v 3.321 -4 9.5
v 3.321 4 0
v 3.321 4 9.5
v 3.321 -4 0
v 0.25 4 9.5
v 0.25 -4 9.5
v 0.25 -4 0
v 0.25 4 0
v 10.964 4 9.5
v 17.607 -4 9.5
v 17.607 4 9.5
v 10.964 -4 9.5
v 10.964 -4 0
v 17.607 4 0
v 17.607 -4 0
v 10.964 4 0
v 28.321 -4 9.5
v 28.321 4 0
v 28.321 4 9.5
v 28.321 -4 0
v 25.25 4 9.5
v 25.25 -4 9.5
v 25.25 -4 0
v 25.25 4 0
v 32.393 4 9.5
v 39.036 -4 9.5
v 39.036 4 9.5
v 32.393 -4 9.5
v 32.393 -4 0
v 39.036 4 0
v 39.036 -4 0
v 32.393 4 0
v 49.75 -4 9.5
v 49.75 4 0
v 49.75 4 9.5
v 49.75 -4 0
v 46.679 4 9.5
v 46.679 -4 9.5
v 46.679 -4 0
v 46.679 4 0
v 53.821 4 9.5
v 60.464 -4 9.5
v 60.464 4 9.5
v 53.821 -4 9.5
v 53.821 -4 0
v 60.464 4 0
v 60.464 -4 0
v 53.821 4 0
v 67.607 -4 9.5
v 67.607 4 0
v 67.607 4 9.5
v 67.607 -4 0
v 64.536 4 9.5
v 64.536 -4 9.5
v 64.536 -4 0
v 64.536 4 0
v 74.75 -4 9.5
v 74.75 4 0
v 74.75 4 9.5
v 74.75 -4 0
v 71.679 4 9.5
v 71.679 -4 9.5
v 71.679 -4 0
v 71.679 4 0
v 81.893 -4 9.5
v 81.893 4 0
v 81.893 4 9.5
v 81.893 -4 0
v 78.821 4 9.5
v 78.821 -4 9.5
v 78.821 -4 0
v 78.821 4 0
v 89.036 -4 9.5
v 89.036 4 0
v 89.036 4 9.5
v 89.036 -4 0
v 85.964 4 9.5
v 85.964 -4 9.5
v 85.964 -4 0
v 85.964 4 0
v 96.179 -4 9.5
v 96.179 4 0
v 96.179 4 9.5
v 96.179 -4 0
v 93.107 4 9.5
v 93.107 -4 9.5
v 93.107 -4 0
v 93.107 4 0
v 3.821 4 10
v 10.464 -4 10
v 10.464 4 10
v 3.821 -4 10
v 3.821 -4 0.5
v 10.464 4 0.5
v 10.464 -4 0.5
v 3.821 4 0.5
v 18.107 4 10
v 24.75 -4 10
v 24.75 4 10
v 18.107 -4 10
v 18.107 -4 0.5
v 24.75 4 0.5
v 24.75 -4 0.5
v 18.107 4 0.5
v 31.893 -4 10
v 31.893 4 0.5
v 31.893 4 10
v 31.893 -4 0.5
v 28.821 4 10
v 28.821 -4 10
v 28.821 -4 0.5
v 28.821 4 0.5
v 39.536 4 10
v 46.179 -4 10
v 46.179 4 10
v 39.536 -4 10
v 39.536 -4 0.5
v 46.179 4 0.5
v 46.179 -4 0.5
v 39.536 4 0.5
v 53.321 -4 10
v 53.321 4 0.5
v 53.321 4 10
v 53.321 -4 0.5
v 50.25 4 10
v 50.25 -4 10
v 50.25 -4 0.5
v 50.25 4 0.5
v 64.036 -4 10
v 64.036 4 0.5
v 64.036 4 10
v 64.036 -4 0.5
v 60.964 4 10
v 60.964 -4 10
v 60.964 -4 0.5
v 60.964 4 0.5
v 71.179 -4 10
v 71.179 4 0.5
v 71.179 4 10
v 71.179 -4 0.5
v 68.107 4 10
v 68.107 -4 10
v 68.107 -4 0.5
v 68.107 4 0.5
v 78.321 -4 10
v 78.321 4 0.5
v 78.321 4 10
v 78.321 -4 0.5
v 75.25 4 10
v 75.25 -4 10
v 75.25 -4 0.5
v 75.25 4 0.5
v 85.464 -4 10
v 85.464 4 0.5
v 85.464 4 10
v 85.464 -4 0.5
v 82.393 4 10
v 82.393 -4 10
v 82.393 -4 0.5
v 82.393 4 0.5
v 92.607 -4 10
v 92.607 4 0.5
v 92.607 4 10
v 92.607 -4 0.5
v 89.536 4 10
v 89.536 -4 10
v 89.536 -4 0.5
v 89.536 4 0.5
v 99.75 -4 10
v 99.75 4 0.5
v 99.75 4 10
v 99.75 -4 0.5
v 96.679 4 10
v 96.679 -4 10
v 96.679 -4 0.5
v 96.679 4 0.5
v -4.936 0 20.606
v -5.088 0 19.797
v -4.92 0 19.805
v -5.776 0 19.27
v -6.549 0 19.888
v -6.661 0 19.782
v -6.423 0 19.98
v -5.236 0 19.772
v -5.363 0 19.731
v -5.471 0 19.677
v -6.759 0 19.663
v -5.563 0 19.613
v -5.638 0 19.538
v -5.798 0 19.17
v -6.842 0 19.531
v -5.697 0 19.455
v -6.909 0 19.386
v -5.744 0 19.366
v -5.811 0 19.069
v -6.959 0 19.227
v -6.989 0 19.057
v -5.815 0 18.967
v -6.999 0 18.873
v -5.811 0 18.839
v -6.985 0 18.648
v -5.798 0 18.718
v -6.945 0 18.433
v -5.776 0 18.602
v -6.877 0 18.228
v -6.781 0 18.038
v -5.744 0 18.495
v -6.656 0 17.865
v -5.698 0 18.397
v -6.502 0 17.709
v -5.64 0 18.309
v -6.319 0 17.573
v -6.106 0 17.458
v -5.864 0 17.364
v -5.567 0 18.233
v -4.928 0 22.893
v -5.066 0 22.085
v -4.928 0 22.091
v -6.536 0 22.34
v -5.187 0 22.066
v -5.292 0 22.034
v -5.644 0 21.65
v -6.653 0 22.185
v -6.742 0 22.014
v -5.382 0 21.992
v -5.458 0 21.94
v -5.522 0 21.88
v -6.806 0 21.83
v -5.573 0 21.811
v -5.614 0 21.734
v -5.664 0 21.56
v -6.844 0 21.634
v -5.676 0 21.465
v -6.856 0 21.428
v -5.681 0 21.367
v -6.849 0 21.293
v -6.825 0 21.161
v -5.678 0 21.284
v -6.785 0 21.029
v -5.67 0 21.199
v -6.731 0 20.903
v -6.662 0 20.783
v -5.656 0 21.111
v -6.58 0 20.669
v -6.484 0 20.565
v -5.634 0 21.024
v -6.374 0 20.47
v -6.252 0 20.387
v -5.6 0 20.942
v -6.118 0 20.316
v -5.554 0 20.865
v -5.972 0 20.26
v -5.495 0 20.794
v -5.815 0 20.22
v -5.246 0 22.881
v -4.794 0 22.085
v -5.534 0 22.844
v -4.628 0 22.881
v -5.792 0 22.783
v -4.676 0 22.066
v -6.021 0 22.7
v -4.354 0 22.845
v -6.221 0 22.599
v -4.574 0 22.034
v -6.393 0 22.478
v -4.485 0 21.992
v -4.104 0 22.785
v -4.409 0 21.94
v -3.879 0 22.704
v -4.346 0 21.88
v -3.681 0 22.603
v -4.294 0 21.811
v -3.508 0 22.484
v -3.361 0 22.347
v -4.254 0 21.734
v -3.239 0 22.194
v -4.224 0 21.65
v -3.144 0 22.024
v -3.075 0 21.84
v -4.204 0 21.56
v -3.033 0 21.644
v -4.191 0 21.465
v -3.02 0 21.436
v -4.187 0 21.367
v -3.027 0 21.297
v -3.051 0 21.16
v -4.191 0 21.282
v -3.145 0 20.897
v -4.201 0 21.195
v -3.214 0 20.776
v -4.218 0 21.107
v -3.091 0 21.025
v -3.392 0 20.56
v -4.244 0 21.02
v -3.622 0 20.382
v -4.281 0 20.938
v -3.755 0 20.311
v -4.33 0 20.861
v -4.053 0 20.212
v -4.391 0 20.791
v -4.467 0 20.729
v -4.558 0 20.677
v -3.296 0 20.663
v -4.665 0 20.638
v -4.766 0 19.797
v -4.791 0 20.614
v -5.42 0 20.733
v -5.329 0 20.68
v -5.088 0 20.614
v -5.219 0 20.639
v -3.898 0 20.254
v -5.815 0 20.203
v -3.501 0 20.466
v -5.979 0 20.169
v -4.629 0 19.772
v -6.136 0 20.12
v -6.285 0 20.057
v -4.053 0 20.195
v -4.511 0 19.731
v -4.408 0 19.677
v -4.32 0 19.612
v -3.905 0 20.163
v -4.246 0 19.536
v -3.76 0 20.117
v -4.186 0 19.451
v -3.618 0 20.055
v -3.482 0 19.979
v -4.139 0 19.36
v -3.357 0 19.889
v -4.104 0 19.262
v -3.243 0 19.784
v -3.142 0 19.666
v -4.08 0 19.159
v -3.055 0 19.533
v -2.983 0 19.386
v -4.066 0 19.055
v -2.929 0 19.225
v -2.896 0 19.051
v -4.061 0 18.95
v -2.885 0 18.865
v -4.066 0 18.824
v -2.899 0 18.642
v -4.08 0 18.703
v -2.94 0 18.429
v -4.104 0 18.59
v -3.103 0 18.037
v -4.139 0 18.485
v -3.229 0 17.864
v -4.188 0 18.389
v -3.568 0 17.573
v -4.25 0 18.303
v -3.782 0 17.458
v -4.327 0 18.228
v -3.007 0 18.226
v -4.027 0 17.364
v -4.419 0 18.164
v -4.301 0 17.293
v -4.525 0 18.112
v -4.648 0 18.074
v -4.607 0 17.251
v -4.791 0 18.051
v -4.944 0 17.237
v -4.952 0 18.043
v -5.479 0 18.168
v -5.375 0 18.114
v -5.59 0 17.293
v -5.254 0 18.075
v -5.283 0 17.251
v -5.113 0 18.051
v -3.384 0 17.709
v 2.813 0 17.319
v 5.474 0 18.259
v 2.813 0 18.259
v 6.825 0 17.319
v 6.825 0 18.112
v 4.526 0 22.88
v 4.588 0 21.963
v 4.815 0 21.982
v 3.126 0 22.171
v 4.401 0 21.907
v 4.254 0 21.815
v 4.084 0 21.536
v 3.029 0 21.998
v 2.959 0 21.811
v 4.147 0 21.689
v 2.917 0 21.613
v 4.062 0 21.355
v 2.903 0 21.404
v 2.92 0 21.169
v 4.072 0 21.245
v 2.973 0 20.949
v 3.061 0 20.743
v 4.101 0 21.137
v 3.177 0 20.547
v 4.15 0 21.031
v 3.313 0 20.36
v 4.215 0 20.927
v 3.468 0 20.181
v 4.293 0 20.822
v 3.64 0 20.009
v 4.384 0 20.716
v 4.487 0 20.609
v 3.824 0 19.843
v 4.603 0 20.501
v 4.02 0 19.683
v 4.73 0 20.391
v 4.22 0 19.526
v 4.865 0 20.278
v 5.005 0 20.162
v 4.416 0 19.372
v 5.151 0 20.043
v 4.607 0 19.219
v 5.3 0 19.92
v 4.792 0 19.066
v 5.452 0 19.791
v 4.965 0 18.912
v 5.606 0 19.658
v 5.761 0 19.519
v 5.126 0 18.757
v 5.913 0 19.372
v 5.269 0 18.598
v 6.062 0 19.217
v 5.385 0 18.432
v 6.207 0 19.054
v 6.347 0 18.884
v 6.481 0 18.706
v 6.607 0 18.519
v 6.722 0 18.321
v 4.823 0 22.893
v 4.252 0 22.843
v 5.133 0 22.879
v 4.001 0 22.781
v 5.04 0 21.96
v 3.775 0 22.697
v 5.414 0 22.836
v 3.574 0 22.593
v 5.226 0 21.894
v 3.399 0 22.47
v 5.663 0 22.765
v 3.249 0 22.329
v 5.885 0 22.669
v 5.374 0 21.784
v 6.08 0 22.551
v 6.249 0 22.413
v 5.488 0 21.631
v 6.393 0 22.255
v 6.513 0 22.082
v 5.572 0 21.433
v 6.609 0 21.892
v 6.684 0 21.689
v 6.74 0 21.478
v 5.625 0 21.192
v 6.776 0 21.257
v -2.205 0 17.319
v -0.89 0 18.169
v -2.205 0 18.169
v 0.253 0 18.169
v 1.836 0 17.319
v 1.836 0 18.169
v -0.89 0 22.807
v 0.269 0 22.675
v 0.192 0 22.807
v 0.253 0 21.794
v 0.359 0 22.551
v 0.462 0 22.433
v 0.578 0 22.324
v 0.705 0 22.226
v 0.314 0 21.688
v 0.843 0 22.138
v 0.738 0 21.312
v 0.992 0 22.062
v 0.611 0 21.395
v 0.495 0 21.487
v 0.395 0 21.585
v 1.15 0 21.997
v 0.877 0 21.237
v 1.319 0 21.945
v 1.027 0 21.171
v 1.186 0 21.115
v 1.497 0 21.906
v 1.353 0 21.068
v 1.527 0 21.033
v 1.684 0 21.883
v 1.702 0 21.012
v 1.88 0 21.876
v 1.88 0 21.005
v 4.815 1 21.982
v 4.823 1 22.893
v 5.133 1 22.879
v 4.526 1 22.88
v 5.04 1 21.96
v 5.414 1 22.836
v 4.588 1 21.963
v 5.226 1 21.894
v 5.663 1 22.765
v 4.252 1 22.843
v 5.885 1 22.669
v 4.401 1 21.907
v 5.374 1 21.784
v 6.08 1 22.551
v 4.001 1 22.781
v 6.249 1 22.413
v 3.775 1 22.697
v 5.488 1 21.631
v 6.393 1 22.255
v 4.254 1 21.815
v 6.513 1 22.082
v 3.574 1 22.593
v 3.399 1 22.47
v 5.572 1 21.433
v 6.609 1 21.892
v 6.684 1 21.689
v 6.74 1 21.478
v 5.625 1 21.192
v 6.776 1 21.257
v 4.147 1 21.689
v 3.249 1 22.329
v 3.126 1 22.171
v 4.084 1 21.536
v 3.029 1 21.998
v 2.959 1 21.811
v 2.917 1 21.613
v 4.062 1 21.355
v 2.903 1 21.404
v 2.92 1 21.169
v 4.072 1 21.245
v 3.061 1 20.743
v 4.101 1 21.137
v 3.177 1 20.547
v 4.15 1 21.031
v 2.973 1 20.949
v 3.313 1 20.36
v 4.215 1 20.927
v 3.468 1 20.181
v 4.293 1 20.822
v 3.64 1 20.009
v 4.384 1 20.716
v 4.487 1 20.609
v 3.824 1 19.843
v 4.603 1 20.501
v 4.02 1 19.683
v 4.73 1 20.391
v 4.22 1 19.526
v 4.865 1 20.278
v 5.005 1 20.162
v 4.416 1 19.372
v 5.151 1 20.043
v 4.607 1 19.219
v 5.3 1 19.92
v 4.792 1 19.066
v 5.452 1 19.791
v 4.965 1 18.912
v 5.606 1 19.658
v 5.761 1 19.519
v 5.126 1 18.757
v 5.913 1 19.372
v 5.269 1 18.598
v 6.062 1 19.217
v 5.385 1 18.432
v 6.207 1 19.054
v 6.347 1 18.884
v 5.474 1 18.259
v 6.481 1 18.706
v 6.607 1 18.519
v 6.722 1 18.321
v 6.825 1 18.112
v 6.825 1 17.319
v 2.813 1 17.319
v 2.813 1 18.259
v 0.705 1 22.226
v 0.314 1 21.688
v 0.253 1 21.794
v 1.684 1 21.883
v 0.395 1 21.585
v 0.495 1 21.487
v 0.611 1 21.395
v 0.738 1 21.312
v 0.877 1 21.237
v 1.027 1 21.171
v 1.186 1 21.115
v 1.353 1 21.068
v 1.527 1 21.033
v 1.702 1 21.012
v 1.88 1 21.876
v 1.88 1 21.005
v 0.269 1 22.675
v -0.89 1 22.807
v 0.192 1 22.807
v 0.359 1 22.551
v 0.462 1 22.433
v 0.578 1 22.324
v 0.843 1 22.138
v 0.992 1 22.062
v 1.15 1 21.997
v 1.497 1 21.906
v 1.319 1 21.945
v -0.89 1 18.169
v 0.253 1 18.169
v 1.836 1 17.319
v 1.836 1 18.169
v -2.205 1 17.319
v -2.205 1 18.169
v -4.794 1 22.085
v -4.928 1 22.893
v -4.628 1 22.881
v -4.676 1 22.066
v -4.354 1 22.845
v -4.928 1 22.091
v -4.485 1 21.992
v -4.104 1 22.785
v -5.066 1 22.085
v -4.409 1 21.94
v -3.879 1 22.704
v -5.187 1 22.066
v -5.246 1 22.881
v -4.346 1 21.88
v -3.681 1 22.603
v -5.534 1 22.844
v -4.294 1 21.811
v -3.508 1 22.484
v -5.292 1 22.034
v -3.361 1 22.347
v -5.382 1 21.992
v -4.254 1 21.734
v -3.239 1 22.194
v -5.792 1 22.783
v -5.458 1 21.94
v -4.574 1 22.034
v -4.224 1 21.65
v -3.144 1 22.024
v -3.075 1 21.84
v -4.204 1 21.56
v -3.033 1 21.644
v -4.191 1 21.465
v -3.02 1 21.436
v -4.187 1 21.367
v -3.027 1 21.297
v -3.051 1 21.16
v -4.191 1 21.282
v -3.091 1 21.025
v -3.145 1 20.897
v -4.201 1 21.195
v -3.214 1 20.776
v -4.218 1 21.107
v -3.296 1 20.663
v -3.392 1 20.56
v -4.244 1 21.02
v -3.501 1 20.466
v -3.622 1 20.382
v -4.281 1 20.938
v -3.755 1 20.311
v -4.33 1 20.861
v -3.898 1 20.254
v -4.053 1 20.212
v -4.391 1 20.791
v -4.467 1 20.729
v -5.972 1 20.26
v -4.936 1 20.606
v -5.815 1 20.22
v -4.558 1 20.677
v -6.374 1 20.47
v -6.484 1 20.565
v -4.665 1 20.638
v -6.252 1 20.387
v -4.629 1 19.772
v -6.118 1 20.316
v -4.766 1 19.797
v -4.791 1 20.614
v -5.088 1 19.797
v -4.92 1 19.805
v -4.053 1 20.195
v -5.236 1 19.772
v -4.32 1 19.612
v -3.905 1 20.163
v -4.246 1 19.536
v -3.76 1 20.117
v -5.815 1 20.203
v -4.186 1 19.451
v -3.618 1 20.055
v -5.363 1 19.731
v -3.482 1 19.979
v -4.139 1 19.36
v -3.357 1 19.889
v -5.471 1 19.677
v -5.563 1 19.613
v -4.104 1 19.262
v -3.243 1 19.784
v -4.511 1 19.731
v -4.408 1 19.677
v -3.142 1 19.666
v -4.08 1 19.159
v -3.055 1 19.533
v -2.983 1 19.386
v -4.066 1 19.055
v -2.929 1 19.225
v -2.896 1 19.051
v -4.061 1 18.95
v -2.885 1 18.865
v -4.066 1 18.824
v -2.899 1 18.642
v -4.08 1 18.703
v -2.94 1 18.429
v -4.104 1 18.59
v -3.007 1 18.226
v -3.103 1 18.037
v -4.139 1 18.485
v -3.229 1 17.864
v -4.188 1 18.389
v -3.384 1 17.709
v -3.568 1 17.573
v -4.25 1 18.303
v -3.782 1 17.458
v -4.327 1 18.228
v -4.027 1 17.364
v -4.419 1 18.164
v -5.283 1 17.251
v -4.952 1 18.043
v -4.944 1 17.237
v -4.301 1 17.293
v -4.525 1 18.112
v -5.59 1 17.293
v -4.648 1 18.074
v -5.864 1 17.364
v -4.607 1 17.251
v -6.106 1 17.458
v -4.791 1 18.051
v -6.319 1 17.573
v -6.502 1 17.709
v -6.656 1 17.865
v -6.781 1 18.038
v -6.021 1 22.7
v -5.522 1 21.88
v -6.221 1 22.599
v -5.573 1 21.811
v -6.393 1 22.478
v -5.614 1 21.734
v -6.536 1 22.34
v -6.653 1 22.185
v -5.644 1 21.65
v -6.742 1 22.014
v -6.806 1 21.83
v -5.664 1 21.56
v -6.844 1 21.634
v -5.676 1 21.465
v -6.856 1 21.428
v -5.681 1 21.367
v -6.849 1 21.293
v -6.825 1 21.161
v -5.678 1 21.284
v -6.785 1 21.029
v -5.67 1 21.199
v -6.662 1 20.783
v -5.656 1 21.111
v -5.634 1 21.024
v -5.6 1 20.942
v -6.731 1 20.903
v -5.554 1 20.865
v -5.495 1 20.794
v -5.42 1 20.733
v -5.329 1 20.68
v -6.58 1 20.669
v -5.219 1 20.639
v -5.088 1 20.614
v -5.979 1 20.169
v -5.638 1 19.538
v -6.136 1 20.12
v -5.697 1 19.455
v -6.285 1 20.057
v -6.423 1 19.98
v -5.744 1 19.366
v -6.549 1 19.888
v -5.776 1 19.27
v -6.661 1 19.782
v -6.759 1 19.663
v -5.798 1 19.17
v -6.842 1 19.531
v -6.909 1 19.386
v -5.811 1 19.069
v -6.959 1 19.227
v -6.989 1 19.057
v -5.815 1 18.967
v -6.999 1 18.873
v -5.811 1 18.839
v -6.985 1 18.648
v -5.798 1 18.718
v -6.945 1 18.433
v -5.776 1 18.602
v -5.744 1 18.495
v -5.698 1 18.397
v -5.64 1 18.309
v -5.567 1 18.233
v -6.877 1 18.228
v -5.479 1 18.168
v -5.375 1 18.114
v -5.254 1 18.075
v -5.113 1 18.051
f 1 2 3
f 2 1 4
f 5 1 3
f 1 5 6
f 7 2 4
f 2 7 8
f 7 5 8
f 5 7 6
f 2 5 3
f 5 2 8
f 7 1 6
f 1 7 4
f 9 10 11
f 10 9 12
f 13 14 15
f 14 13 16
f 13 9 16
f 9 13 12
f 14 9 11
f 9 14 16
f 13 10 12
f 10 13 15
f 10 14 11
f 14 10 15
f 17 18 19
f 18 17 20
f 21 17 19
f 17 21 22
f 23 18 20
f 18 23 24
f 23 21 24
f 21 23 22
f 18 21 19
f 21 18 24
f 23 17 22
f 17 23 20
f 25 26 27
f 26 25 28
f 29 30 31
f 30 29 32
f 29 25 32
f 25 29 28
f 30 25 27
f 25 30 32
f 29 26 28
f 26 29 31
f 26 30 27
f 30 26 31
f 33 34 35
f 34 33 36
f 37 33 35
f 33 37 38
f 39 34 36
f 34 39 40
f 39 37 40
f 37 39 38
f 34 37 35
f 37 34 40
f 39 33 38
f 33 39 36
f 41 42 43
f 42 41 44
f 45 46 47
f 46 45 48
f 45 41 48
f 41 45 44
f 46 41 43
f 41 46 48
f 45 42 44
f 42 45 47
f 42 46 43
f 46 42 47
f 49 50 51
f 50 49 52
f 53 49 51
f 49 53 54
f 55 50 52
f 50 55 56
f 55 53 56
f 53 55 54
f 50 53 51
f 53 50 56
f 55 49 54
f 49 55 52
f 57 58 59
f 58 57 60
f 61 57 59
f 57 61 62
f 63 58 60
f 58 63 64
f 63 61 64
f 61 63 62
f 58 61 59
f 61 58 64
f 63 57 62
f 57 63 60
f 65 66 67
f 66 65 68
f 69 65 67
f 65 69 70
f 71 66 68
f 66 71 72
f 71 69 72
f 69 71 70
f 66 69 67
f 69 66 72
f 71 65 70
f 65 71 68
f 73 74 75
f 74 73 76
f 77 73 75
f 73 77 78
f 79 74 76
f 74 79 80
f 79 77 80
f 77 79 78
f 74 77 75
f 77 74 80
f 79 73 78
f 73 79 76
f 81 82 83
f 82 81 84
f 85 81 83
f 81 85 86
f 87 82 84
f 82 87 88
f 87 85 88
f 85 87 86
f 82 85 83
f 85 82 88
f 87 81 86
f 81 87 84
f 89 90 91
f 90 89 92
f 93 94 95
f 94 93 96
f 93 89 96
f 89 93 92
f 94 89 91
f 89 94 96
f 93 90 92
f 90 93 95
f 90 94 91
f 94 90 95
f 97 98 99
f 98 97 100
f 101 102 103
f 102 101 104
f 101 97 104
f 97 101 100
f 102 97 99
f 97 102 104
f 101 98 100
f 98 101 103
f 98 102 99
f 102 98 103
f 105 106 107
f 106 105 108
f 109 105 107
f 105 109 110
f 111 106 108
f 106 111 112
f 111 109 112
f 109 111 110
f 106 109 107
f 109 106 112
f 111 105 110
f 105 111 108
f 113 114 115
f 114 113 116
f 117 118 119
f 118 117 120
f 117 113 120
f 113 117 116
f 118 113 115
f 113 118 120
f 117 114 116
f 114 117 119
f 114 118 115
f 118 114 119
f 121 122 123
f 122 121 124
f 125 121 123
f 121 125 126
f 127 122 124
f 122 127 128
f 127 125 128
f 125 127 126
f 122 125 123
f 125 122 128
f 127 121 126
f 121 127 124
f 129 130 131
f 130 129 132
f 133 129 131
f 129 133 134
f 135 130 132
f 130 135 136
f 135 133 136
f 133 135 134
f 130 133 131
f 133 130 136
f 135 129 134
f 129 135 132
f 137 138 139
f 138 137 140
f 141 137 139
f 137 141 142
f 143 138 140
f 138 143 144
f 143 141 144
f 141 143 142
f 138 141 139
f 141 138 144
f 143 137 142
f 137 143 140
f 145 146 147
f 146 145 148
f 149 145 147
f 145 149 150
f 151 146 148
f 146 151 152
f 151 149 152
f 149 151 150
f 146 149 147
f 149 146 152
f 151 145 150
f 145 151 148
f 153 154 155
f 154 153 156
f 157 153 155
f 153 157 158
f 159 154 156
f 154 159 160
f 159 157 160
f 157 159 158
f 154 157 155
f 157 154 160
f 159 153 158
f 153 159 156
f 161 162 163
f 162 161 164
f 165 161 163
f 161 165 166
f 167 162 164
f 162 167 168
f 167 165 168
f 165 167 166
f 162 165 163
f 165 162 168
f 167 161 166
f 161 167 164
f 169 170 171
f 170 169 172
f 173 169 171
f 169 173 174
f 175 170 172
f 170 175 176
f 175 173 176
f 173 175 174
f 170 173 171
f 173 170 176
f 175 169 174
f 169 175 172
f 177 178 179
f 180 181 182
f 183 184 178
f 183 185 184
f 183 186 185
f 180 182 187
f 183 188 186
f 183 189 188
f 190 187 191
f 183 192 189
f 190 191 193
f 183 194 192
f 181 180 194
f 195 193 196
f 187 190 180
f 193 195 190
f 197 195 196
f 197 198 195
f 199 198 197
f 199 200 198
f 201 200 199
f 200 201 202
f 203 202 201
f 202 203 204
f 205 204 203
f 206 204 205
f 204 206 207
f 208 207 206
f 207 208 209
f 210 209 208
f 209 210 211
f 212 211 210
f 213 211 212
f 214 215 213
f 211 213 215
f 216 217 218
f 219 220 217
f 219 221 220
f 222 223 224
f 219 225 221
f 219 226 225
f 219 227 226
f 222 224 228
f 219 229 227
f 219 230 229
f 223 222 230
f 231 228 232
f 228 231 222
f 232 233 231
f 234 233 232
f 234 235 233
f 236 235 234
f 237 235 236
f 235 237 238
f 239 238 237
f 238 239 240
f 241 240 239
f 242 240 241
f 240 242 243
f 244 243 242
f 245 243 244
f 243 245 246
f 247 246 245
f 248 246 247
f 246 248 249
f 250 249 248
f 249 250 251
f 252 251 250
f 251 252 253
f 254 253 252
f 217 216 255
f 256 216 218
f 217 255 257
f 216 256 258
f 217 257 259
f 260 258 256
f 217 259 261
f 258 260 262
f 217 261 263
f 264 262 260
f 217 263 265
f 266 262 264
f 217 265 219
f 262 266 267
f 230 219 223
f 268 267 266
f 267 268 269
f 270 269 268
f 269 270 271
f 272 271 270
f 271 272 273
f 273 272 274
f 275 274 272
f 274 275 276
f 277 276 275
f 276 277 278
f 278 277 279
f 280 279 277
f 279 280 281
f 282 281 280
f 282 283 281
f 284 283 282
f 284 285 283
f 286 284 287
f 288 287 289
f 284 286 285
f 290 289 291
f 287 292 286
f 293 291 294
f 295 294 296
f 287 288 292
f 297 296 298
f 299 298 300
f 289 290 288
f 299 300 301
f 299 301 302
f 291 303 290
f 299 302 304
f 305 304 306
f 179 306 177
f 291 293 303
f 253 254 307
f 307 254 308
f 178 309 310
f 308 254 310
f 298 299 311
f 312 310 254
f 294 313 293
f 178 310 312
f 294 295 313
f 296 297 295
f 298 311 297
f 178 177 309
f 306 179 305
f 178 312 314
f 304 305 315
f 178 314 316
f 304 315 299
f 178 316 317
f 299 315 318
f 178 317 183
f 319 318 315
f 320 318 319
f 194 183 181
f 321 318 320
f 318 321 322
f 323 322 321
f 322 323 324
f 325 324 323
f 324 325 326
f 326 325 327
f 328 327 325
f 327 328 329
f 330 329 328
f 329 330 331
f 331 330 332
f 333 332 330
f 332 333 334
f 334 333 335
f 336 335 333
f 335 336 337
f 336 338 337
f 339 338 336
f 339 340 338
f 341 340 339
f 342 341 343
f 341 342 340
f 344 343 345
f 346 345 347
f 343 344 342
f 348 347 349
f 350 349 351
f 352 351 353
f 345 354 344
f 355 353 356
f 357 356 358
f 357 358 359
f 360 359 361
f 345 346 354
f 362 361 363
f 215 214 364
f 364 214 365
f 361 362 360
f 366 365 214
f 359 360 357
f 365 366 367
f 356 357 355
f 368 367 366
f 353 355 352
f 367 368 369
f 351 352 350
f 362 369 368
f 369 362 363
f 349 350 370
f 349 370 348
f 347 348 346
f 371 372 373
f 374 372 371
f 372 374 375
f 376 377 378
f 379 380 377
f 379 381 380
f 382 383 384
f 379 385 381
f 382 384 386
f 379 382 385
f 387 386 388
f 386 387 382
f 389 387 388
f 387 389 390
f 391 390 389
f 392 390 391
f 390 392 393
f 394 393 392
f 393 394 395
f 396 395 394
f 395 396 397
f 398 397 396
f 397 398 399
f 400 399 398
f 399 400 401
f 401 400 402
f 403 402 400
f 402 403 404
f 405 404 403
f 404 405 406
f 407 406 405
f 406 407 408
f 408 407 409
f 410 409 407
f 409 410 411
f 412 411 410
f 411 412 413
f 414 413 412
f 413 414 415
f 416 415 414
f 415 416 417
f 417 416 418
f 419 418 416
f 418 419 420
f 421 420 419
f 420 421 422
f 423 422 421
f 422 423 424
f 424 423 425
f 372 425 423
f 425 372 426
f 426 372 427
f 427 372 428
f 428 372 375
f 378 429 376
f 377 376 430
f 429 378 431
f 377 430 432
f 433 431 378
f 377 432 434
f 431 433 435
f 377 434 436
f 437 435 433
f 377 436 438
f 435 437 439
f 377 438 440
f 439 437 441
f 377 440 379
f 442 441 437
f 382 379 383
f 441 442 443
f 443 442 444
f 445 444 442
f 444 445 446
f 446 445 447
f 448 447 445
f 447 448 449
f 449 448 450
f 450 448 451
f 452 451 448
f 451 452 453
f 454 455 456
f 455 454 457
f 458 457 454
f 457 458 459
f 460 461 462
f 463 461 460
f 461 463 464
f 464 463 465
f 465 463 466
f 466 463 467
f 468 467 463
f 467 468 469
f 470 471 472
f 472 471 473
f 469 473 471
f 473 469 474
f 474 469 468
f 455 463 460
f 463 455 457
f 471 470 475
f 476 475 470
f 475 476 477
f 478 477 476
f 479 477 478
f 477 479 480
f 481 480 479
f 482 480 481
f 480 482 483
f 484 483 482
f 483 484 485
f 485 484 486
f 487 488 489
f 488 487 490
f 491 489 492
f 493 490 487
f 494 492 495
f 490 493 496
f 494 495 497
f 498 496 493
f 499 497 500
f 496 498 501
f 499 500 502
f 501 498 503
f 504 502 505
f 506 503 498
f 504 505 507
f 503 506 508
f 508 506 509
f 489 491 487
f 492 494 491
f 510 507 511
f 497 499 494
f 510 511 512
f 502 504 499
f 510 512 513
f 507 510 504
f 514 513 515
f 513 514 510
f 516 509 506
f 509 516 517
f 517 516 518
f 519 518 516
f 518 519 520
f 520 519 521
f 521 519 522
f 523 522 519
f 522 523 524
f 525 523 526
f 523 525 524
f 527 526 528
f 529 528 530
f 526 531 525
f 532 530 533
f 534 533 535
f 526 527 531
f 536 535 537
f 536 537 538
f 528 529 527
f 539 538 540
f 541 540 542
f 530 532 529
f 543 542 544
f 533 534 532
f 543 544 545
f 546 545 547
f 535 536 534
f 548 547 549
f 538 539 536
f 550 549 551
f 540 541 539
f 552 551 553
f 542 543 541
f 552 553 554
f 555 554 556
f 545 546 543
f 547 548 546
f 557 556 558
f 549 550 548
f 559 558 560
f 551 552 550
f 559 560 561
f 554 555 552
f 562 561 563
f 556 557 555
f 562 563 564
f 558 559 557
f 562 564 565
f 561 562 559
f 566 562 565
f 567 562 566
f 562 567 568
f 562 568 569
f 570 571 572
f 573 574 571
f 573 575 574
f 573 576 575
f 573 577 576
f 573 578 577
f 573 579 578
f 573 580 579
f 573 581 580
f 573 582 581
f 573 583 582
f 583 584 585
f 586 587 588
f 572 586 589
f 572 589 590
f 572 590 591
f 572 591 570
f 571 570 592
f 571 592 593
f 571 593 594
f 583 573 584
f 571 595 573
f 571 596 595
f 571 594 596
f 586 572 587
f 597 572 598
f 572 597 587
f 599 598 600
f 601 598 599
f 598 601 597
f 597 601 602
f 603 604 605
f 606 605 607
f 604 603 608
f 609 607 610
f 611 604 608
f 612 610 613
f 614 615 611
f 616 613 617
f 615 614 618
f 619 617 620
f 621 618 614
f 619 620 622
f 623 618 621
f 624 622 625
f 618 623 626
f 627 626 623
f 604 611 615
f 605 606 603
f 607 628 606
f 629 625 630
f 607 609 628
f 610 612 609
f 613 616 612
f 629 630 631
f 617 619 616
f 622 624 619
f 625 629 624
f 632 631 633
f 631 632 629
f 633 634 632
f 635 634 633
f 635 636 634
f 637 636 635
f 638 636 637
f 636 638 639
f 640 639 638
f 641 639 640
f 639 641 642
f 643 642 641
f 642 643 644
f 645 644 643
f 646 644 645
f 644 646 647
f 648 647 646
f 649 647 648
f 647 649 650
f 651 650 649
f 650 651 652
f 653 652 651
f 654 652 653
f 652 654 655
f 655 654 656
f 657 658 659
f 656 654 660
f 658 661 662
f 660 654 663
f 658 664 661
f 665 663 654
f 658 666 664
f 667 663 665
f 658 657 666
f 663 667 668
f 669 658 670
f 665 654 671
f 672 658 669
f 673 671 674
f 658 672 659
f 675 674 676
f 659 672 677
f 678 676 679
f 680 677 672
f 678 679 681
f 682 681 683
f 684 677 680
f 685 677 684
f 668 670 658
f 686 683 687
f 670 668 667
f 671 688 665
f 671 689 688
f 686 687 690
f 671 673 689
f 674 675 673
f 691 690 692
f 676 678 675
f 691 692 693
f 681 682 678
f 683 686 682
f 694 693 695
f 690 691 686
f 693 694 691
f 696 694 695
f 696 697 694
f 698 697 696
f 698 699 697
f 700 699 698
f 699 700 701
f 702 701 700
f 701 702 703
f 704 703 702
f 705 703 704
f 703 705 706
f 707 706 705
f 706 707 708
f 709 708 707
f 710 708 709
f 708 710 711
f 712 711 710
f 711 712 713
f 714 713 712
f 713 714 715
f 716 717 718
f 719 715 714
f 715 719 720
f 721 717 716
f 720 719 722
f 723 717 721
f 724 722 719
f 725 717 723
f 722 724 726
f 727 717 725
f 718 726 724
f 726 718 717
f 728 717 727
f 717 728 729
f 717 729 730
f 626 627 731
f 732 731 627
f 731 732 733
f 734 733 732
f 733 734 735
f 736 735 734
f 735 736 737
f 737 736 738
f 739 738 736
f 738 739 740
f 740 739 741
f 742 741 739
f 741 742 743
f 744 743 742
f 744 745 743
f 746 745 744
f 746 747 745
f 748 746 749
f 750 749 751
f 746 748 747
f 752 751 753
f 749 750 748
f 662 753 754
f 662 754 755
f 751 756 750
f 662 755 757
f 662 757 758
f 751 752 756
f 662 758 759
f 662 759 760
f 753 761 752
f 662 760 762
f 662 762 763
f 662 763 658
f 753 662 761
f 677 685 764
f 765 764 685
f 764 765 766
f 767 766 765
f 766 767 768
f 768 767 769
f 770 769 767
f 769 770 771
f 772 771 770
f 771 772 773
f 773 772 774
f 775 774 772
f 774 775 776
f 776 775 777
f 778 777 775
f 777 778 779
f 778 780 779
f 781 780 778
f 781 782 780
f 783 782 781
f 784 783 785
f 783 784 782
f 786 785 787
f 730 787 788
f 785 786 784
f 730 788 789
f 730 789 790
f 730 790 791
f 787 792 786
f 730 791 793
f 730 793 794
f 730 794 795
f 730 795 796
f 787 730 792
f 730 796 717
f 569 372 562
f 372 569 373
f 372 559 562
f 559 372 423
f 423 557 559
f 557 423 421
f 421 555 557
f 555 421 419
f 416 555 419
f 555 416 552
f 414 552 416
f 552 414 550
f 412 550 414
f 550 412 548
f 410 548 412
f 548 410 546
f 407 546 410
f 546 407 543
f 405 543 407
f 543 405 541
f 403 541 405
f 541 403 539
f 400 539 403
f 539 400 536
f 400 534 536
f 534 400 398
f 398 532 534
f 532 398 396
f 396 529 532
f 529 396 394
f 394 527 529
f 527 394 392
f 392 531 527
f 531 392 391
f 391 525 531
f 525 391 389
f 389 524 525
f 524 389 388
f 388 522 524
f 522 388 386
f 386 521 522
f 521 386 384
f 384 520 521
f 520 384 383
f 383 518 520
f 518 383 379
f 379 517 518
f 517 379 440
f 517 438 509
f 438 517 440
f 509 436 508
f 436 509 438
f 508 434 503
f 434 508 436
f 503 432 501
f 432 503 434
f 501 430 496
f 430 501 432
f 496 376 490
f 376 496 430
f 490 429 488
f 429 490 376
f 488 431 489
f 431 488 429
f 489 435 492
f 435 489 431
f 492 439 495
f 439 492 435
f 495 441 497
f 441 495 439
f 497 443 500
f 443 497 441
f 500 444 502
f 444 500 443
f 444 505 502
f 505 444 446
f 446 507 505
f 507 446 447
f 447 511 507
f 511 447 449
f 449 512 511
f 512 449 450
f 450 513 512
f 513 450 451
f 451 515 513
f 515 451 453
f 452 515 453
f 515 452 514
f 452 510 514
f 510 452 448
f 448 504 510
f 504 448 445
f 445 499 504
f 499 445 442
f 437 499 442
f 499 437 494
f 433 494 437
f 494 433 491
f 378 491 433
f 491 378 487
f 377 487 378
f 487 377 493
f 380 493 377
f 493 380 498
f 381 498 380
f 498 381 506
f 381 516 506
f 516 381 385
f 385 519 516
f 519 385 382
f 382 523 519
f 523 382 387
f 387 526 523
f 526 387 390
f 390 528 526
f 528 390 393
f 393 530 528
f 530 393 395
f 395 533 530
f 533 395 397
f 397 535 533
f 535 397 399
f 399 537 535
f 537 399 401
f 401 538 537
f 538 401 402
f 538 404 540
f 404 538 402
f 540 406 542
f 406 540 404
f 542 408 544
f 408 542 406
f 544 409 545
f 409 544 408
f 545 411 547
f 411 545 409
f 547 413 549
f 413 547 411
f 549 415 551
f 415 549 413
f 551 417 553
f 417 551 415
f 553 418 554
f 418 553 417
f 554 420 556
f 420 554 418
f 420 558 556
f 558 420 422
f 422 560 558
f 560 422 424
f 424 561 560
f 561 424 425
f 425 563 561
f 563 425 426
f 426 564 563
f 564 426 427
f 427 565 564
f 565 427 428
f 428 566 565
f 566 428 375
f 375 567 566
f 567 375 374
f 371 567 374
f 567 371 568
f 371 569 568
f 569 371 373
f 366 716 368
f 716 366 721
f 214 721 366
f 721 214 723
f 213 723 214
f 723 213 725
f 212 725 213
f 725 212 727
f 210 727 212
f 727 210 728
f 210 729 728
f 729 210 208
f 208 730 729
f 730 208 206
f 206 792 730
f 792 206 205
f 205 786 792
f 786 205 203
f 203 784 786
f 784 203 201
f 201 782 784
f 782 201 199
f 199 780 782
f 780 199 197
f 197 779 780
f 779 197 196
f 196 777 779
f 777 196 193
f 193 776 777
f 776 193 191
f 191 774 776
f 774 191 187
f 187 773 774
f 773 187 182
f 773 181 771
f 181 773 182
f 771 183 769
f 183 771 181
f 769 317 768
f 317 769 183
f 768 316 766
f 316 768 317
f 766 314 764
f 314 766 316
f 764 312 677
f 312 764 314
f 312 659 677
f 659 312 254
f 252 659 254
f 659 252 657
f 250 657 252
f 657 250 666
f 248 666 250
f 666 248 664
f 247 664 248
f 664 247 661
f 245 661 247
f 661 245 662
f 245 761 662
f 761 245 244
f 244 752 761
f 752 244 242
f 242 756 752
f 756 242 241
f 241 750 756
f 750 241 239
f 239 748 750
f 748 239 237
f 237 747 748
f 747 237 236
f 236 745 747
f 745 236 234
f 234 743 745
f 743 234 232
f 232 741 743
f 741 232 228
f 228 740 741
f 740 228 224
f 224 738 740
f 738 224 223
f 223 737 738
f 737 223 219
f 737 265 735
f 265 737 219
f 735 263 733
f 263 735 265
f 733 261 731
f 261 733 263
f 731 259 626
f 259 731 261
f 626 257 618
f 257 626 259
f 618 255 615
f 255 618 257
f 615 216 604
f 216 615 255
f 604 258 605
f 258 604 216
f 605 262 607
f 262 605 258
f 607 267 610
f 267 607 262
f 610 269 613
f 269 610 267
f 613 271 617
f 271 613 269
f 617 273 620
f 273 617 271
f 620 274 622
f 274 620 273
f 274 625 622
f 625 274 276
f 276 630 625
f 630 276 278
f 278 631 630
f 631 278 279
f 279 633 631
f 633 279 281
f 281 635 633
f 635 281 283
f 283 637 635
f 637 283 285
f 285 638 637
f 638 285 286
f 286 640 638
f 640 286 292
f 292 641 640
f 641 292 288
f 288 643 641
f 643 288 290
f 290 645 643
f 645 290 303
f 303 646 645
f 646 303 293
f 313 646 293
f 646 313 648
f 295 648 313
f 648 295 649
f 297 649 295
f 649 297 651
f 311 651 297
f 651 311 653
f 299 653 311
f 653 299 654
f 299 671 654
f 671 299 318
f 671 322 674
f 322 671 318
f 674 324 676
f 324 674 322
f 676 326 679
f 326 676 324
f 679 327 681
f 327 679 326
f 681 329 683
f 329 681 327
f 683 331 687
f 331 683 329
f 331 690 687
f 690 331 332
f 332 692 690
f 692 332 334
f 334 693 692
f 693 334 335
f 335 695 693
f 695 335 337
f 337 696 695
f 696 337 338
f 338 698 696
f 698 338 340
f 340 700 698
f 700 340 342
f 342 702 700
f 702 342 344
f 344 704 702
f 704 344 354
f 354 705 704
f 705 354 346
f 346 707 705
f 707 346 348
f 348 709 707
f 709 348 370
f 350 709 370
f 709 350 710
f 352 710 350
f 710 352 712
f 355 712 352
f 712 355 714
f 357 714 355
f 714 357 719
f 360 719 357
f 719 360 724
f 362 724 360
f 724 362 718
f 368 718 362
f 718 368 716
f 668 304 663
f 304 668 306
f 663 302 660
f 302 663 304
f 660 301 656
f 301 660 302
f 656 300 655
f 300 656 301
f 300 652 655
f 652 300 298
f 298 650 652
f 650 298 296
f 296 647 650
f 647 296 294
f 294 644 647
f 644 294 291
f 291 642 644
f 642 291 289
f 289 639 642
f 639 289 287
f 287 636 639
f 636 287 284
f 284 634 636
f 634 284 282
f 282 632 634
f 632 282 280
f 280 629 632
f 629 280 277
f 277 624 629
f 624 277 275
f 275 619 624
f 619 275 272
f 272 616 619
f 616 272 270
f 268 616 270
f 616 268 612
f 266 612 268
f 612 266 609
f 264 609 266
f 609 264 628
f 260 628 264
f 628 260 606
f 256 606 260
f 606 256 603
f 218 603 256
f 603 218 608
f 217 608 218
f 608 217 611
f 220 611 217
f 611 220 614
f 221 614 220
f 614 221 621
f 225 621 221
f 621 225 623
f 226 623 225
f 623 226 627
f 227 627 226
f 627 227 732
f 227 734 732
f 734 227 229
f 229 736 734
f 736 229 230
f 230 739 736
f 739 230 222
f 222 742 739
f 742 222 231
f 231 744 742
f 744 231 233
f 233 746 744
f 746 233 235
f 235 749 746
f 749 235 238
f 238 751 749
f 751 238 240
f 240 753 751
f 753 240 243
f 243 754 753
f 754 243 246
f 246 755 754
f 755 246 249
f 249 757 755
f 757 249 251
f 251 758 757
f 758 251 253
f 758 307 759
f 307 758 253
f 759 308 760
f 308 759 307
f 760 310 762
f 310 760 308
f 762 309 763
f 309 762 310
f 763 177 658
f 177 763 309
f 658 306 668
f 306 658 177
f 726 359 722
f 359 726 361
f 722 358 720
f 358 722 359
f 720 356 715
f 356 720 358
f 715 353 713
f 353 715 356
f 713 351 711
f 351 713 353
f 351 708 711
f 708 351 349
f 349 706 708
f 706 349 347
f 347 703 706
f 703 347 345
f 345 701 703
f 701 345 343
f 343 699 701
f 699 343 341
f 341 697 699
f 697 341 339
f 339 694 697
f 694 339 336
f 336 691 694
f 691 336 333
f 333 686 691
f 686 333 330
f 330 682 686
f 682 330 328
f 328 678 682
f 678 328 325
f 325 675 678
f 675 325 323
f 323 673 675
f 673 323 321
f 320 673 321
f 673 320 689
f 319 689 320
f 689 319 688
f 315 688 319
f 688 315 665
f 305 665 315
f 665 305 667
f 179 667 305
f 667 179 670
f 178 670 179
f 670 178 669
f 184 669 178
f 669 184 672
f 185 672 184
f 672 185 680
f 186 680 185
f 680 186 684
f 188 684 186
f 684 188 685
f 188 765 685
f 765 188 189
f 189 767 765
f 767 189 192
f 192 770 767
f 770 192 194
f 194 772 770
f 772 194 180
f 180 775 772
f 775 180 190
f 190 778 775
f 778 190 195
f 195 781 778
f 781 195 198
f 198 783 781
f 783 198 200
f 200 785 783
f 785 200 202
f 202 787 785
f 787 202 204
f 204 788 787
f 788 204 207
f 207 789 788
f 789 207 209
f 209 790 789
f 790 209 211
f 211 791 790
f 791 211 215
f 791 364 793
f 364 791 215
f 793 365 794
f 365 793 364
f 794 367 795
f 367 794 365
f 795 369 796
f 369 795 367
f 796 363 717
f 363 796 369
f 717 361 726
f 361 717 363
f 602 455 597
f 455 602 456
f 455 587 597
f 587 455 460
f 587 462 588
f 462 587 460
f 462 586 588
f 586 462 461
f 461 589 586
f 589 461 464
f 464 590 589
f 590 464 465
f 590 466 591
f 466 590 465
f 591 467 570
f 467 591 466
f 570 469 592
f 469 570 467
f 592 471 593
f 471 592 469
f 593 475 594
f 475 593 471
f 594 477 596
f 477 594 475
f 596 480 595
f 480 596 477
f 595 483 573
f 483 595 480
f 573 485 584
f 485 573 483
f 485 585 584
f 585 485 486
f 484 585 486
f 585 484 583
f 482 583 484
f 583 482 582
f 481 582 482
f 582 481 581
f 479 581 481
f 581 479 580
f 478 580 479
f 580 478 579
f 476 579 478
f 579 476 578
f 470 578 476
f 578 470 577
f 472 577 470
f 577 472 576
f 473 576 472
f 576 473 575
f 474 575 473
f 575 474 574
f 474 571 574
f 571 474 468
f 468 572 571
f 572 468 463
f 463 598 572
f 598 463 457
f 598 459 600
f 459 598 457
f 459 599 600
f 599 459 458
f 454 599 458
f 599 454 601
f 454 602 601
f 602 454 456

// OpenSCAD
// file: code_dim.scad
// codings
code_n=14;  // number of bits
pass=0.5;   // gap between the code stripes

// label for the code
label_width=24;
label_thick=0.5;
label_size=6;
label_text_thick=1;
label_height=label_size+2;
// main file
// code stripes 
//
// to do:
// - convert code in bits using loop, if possible with scad
// - consider other forms than cubes (why not characters?)

include <code_dim.scad>

code=218;//[0:16383]
x=100;
y=8;
z=10;
code_label=true;
plate=false;

module code_label(code=0,plate=false){
 code_str=str(code);   
 if(plate==true)   
 cube([label_width,label_thick,label_height],center=true);            
 rotate([90,0,180])linear_extrude(height = label_text_thick) 
 text(code_str,
    font = "Courier:style=Bold",
    size=label_size,
    halign ="center",
    valign ="center");
}

module code_stripe(code=code,s=[100,8,10],inv=0){
       
 bit_x=s.x/code_n/2; // x dimension of half bit without pass considered   
    
 function bit(inv=0,bit=0,x=0)=(inv==0)
  ?bit_x*(2*x+bit+1/2)
  :bit_x*(((bit+1)%2)+2*x+1/2);  ;  
  
 function zpos(inv=0)=(inv==0)
  ?s.z/2-pass/2
  :s.z/2+pass/2;        
          
 function get_bit(x=0)=((x%2)==0)? 0:1;
 function get_rest(x=0)=floor(x/2);  
 function p(x)=pow(2,x);
 
 // since variables can not be overwritten in OpenSCAD as required in lops 
 // individual variables per bits are created     
 d13=floor((code                                                                                                                )/p(13));
 d12=floor((code-d13*p(13)                                                                                                      )/p(12));     
 d11=floor((code-d13*p(13)-d12*p(12)                                                                                            )/p(11));         
 d10=floor((code-d13*p(13)-d12*p(12)-d11*p(11)                                                                                  )/p(10));
 d9 =floor((code-d13*p(13)-d12*p(12)-d11*p(11)-d10*p(10)                                                                        )/p(9));          
 d8 =floor((code-d13*p(13)-d12*p(12)-d11*p(11)-d10*p(10)-d9*p(9)                                                                )/p(8));       
 d7 =floor((code-d13*p(13)-d12*p(12)-d11*p(11)-d10*p(10)-d9*p(9)-d8*p(8)                                                        )/p(7));    
 d6 =floor((code-d13*p(13)-d12*p(12)-d11*p(11)-d10*p(10)-d9*p(9)-d8*p(8)-d7*p(7)                                                )/p(6));     
 d5 =floor((code-d13*p(13)-d12*p(12)-d11*p(11)-d10*p(10)-d9*p(9)-d8*p(8)-d7*p(7)-d6*p(6)                                        )/p(5));          
 d4 =floor((code-d13*p(13)-d12*p(12)-d11*p(11)-d10*p(10)-d9*p(9)-d8*p(8)-d7*p(7)-d6*p(6)-d5*p(5)                                )/p(4));       
 d3 =floor((code-d13*p(13)-d12*p(12)-d11*p(11)-d10*p(10)-d9*p(9)-d8*p(8)-d7*p(7)-d6*p(6)-d5*p(5)-d4*p(4)                        )/p(3));   
 d2 =floor((code-d13*p(13)-d12*p(12)-d11*p(11)-d10*p(10)-d9*p(9)-d8*p(8)-d7*p(7)-d6*p(6)-d5*p(5)-d4*p(4)-d3*p(3)                )/p(2));        
 d1 =floor((code-d13*p(13)-d12*p(12)-d11*p(11)-d10*p(10)-d9*p(9)-d8*p(8)-d7*p(7)-d6*p(6)-d5*p(5)-d4*p(4)-d3*p(3)-d2*p(2)        )/p(1));   
 d0 =floor((code-d13*p(13)-d12*p(12)-d11*p(11)-d10*p(10)-d9*p(9)-d8*p(8)-d7*p(7)-d6*p(6)-d5*p(5)-d4*p(4)-d3*p(3)-d2*p(2)-d1*p(1))/p(0));   

 d=[d0,d1,d2,d3,d4,d5,d6,d7,d8,d9,d10,d11,d12,d13];
       
 for (x = [ 0 : code_n - 1 ]) {    
    translate([bit(inv,d[x],x),
                   0,
                   zpos(inv)])
    
    cube([bit_x-pass, 
              s.y,
              s.z-pass],
             center=true);    // coded bits
      
    if(       ((d[x]==0)&&(d[x-1]==1)&&(inv==0))  
           ||  ((d[x]==1)&&(d[x-1]==0)&&(inv==1))  )
        {
          translate([x*bit_x*2,
                        0,
                        zpos(inv)])
          cube([pass*2,s.y,s.z-pass],center=true);  // fillers for not necessary pass gaps
    }
 }    
}

color("Red")
code_stripe(code=code,s=[x,y,z],inv=0);

color("Blue")
code_stripe(code=code,s=[x,y,z],inv=1);

if(code_label==true){
  translate([0,0,20])code_label(code=code,plate=plate);
}
